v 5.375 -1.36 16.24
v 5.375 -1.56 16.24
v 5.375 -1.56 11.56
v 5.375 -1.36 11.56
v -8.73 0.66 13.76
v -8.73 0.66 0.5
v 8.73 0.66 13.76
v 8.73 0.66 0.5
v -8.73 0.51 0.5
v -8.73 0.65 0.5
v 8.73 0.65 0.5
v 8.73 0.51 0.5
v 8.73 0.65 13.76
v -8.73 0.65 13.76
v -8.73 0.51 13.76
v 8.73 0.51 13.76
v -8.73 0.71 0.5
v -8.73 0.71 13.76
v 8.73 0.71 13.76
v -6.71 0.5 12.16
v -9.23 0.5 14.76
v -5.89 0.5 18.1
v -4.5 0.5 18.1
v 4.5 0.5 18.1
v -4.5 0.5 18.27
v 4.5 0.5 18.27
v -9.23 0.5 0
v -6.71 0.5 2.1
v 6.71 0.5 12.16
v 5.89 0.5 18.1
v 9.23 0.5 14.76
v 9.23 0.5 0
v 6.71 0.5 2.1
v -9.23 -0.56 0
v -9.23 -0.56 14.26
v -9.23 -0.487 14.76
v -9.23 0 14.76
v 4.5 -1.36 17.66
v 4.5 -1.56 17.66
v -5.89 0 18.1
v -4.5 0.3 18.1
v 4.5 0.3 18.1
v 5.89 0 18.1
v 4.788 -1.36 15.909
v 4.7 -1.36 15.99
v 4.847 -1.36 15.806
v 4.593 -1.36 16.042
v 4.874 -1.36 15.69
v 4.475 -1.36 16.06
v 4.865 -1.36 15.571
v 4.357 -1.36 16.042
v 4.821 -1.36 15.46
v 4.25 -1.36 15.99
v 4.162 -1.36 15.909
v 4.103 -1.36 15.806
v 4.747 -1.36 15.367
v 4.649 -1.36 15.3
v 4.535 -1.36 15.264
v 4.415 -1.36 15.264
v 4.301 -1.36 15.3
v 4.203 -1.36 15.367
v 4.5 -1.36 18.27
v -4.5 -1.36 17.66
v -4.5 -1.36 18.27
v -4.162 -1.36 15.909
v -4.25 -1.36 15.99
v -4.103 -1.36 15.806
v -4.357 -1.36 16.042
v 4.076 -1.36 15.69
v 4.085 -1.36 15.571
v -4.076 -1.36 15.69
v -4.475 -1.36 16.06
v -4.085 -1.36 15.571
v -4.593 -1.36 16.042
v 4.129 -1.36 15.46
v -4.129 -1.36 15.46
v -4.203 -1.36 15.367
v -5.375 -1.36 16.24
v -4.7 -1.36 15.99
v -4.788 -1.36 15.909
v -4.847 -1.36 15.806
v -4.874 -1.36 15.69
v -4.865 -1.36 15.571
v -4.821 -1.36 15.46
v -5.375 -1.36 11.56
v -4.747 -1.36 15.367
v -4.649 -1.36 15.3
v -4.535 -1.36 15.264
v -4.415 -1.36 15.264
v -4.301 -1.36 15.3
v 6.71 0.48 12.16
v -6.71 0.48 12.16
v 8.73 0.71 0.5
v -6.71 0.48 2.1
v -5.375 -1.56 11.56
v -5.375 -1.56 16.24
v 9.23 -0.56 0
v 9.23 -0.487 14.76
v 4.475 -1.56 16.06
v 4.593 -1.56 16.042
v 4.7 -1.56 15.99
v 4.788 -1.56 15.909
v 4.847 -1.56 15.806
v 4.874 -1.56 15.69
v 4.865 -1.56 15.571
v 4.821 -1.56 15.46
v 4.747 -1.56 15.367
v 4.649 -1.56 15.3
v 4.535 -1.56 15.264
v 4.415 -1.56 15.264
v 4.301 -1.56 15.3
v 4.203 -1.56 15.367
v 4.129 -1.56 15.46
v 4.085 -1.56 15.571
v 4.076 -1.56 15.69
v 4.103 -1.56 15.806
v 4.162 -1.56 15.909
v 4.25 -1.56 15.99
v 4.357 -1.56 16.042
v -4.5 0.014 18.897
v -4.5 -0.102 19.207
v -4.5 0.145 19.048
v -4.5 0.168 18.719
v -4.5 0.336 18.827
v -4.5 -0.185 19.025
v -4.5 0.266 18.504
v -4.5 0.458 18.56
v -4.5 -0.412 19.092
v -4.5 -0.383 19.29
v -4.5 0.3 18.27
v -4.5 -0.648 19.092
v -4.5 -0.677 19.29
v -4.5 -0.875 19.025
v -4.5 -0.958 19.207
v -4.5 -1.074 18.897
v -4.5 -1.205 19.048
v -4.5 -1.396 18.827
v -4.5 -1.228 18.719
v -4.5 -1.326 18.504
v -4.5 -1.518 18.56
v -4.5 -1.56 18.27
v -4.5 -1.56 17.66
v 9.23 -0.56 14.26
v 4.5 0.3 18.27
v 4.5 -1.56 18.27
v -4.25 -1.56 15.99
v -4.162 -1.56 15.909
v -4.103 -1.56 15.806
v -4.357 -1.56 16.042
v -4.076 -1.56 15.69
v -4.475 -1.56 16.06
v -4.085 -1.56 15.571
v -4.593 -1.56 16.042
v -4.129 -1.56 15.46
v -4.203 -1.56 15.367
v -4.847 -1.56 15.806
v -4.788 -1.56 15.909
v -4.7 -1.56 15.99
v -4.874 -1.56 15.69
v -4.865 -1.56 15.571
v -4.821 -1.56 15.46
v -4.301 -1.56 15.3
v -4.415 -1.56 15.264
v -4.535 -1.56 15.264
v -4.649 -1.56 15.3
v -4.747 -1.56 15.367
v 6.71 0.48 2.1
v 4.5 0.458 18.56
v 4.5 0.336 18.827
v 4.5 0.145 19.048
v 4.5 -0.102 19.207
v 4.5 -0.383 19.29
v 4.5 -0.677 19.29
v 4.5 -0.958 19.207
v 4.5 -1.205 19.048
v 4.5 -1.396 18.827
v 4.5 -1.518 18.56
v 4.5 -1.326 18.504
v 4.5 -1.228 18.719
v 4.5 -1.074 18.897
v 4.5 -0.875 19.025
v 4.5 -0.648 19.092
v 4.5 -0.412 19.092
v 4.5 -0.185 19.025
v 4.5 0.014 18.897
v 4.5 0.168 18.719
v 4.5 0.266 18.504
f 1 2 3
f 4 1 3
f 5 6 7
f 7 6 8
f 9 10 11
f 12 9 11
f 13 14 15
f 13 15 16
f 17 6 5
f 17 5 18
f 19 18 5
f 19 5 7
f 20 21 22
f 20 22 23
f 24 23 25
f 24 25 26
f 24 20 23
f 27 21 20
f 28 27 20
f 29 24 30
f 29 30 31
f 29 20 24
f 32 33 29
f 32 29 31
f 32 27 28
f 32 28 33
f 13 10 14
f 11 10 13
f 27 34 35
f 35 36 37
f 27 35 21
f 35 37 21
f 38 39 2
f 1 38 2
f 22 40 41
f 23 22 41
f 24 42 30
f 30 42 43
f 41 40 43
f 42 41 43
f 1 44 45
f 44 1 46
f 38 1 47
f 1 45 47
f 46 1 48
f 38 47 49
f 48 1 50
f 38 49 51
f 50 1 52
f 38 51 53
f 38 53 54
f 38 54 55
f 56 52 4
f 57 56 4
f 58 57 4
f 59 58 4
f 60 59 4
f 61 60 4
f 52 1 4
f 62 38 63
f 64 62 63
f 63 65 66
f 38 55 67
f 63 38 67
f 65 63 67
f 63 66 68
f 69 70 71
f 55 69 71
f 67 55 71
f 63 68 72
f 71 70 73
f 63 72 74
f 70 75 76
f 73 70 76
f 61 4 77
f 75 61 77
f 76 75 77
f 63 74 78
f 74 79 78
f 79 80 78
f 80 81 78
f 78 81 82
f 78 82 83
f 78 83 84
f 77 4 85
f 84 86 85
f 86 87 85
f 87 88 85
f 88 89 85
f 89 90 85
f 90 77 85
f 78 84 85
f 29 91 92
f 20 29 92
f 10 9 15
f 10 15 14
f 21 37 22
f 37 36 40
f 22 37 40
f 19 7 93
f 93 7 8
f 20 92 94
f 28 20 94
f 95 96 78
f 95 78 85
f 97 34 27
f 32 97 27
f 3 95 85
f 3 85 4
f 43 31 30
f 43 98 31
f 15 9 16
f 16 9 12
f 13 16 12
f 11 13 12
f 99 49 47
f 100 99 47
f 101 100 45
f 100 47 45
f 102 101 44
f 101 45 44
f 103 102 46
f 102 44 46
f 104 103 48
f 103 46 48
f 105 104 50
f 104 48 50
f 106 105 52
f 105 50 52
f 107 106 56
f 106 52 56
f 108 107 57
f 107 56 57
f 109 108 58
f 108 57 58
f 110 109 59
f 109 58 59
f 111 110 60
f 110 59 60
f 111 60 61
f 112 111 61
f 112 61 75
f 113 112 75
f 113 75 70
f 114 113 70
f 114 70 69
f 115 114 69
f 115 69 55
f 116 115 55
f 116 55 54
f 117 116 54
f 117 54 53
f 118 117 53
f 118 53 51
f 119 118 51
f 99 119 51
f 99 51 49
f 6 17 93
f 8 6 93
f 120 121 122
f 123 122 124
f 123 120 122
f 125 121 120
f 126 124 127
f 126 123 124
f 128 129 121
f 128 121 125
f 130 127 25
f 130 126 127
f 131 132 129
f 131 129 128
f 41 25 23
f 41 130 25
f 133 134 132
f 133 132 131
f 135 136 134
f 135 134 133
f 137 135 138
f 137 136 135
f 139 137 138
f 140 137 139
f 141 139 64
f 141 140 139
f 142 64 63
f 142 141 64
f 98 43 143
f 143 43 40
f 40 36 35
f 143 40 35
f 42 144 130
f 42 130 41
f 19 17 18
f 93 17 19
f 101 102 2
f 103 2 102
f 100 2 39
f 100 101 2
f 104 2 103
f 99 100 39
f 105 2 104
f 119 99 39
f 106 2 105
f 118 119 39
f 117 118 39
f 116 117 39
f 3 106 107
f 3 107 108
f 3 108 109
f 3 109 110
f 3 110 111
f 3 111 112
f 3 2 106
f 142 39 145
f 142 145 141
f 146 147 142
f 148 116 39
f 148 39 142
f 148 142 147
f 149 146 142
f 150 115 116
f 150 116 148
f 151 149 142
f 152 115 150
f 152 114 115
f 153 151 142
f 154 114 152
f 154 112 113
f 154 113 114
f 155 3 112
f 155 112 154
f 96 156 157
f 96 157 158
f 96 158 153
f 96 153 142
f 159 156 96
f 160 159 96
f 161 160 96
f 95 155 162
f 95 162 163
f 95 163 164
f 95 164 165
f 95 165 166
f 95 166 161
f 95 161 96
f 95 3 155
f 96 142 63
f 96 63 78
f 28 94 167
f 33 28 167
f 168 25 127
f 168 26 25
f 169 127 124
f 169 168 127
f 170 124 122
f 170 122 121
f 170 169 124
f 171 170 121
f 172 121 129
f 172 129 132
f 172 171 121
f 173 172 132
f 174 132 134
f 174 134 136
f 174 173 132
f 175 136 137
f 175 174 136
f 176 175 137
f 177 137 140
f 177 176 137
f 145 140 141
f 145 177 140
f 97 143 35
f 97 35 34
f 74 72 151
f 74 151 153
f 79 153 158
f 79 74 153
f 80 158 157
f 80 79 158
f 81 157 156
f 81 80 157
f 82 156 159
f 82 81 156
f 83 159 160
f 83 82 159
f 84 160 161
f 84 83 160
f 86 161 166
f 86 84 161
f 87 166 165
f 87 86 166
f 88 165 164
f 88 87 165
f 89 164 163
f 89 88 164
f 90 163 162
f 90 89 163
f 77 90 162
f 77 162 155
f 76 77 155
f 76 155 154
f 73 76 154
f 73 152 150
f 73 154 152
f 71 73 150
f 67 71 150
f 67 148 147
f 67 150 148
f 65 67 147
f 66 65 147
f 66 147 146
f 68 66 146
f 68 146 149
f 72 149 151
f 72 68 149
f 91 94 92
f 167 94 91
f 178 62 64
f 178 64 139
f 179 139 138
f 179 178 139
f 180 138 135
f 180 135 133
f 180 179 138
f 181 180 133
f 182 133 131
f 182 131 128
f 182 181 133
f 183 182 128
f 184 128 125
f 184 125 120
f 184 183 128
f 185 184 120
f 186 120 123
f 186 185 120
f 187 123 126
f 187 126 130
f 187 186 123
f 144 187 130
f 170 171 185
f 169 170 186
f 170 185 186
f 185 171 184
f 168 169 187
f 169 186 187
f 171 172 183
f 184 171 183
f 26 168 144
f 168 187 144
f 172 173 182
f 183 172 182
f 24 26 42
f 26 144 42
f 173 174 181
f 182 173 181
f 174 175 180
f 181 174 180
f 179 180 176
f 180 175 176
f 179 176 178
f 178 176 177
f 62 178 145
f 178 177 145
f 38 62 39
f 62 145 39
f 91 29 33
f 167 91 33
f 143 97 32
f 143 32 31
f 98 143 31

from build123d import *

# Parameters (mm, degrees)
EXTRUDE_1_DEPTH      = 0.5
SKETCH_3_W           = 9.23
SKETCH_3_H           = 14.26
EXTRUDE_2_DEPTH      = 0.56
SKETCH_4_W           = 8.73
SKETCH_4_H           = 13.26
EXTRUDE_3_DEPTH      = 0.14
SKETCH_6_W           = 6.71
SKETCH_6_H           = 10.06
CUT_EXTRUDE_1_DEPTH  = 0.02
EXTRUDE_4_REACH      = 22.328
CUT_EXTRUDE_2_DEPTH  = 21.327946281
SKETCH_9_W           = 8.73
SKETCH_9_H           = 13.26
EXTRUDE_2209_DEPTH   = 0.05
MIRROR_START         = 0.5
MIRROR_1_OUTLINE_W   = 8.73
MIRROR_1_OUTLINE_H   = 0.05
MIRROR_1_DEPTH       = 13.26
MIRROR_1_2_OUTLINE_W = 8.73
MIRROR_1_2_OUTLINE_H = 0.14
MIRROR_1_2_DEPTH     = 13.26
MIRROR_1_3_DEPTH     = 0.48
MIRROR_START_2       = -0.56
MIRROR_1_4_OUTLINE_W = 6.71
MIRROR_1_4_OUTLINE_H = 10.06
MIRROR_1_4_DEPTH     = 0.60719
MIRROR_START_3       = 0.48
MIRROR_1_5_DEPTH     = 0.02
MIRROR_START_4       = -9.23
MIRROR_1_6_DEPTH     = 9.23
MIRROR_START_5       = -20
MIRROR_1_7_OUTLINE_W = 8
MIRROR_1_7_OUTLINE_H = 2
MIRROR_1_7_DEPTH     = 3.036508319
EXTRUDE_6_DEPTH      = 4.5
EXTRUDE_7_DEPTH      = 0.2
SKETCH_15_R          = 0.4
CUT_EXTRUDE_3_DEPTH  = 22.493436207


with BuildPart() as part:
    # 草图2 → 凸台-拉伸1 (new body)
    with BuildSketch(Plane(origin=(0, 0, 0), x_dir=(1, 0, 0), z_dir=(0, 1, 0))):
        Polygon((9.23, -14.76), (5.89, -18.1), (0, -18.1), (0, 0), (9.23, 0), align=None)
    extrude(amount=EXTRUDE_1_DEPTH)

    # 草图3 → 凸台-拉伸2 (add)
    with BuildSketch(Plane.XZ):
        with Locations((4.615, 7.13)):
            Rectangle(SKETCH_3_W, SKETCH_3_H)
    extrude(amount=EXTRUDE_2_DEPTH)

    # 草图6 → 切除-拉伸1 (cut)
    with BuildSketch(Plane(origin=(0, 0.5, 0), x_dir=(1, 0, 0), z_dir=(0, 1, 0))):
        with Locations((3.355, -7.13)):
            Rectangle(SKETCH_6_W, SKETCH_6_H)
    extrude(amount=-CUT_EXTRUDE_1_DEPTH, mode=Mode.SUBTRACT)

    # 凸台-拉伸4: up to this face of the body (flat: up to its plane)
    extrude_4_end = Plane(part.part.faces().sort_by_distance((9.23, -0.025444369, 7.250073411))[0])
    # 草图8 → 凸台-拉伸4 (add, up to the picked face)
    with BuildSketch(Plane.ZY, mode=Mode.PRIVATE) as extrude_4_sk1:
        Polygon((14.26, 0), (18.1, 0), (14.26, -0.56), align=None)
    extrude_4_tool1 = split(extrude(extrude_4_sk1.sketch, amount=-EXTRUDE_4_REACH, mode=Mode.PRIVATE), bisect_by=extrude_4_end, keep=Keep.BOTH, mode=Mode.PRIVATE)
    add(extrude_4_tool1.solids().sort_by(Axis((0, -0.186667, 15.54), (1, 0, 0)))[0])

    # 草图12 → 切除-拉伸2 (cut, through all)
    with BuildSketch(Plane(origin=(0, 0, 0), x_dir=(1, 0, 0), z_dir=(0, 1, 0))):
        Polygon((9.23, -14.76), (5.89, -18.1), (9.23, -18.1), align=None)
    extrude(amount=-CUT_EXTRUDE_2_DEPTH, mode=Mode.SUBTRACT)

    # Mirror 1 3 outline → Mirror 1 3 (add)
    with BuildSketch(Plane(origin=(0, 0, 0), x_dir=(1, 0, 0), z_dir=(0, 1, 0))):
        Polygon((-5.89, -18.1), (0, -18.1), (0, 0), (-9.23, 0), (-9.23, -14.76), align=None)
    extrude(amount=MIRROR_1_3_DEPTH)

    # Mirror 1 4 outline → Mirror 1 4 (add)
    with BuildSketch(Plane(origin=(0, 0, 0), x_dir=(1, 0, 0), z_dir=(0, 1, 0)).offset(MIRROR_START_2)):
        with Locations((-3.355, -7.13)):
            Rectangle(MIRROR_1_4_OUTLINE_W, MIRROR_1_4_OUTLINE_H)
    extrude(amount=MIRROR_1_4_DEPTH)

    # Mirror 1 5 outline → Mirror 1 5 (add)
    with BuildSketch(Plane(origin=(0, 0, 0), x_dir=(1, 0, 0), z_dir=(0, 1, 0)).offset(MIRROR_START_3)):
        Polygon((-5.89, -18.1), (0, -18.1), (0, -12.16), (-6.71, -12.16), (-6.71, -2.1), (0, -2.1), (0, 0), (-9.23, 0), (-9.23, -14.76), align=None)
    extrude(amount=MIRROR_1_5_DEPTH)

    # Mirror 1 6 outline → Mirror 1 6 (add)
    with BuildSketch(Plane.YZ.offset(MIRROR_START_4)):
        Polygon((-0.56, 0), (0, 0), (0, 18.1), (-0.56, 14.26), align=None)
    extrude(amount=MIRROR_1_6_DEPTH)

    # Mirror 1 7 outline → Mirror 1 7 (cut)
    with BuildSketch(Plane(origin=(0, 0, 0), x_dir=(0.707106781186552, 0, 0.7071067811865429), z_dir=(0.707106781186543, 0, -0.707106781186552)).offset(MIRROR_START_5)):
        with Locations((6, 1)):
            Rectangle(MIRROR_1_7_OUTLINE_W, MIRROR_1_7_OUTLINE_H)
    extrude(amount=MIRROR_1_7_DEPTH, mode=Mode.SUBTRACT)

    # 草图11 → 凸台-拉伸6 (add, symmetric)
    with BuildSketch(Plane(origin=(0, 0, 0), x_dir=(0, 0, -1), z_dir=(1, 0, 0))):
        with BuildLine():
            Line((-18.27, -1.56), (-18.27, -1.36))
            ThreePointArc((-18.27, -1.36), (-19.1, -0.53), (-18.27, 0.3))
            Line((-18.27, 0.3), (-18.1, 0.3))
            Line((-18.1, 0.3), (-18.1, 0.5))
            Line((-18.1, 0.5), (-18.27, 0.5))
            ThreePointArc((-18.27, 0.5), (-19.3, -0.53), (-18.27, -1.56))
        make_face()
    extrude(amount=EXTRUDE_6_DEPTH, both=True)

    # 草图14 → 凸台-拉伸7 (add)
    with BuildSketch(Plane(origin=(0, -1.56, 0), x_dir=(-1, 0, 0), z_dir=(0, -1, 0))):
        Polygon((-5.375, -16.24), (-5.375, -11.56), (0, -11.56), (0, -18.27), (-4.5, -18.27), (-4.5, -17.66), align=None)
    extrude_7 = extrude(amount=-EXTRUDE_7_DEPTH)

    # 草图15 → 切除-拉伸3 (cut, through all)
    with BuildSketch(Plane(origin=(0, -1.36, 0), x_dir=(1, 0, 0), z_dir=(0, 1, 0))):
        with Locations(Location((4.475, -15.66, 0), (0, 0, 270))):
            Circle(SKETCH_15_R)
    cut_extrude_3 = extrude(amount=-CUT_EXTRUDE_3_DEPTH, mode=Mode.SUBTRACT)

    # 镜向2: 凸台-拉伸7, 切除-拉伸3 across Right Plane
    add(extrude_7.mirror(Plane(origin=(0, 0, 0), x_dir=(0, 0, -1), z_dir=(1, 0, 0))))
    add(cut_extrude_3.mirror(Plane(origin=(0, 0, 0), x_dir=(0, 0, -1), z_dir=(1, 0, 0))), mode=Mode.SUBTRACT)


with BuildPart() as body_2:
    # 草图4 → 凸台-拉伸3 (new body)
    with BuildSketch(Plane(origin=(0, 0.51, 0), x_dir=(1, 0, 0), z_dir=(0, 1, 0))):
        with Locations((4.365, -7.13)):
            Rectangle(SKETCH_4_W, SKETCH_4_H)
    extrude(amount=EXTRUDE_3_DEPTH)

    # Mirror 1 2 outline → Mirror 1 2 (add)
    with BuildSketch(Plane.XY.offset(MIRROR_START)):
        with Locations((-4.365, 0.58)):
            Rectangle(MIRROR_1_2_OUTLINE_W, MIRROR_1_2_OUTLINE_H)
    extrude(amount=MIRROR_1_2_DEPTH)


with BuildPart() as body_3:
    # 草图9 → Extrude 2209 (new body)
    with BuildSketch(Plane(origin=(0, 0.66, 0), x_dir=(1, 0, 0), z_dir=(0, 1, 0))):
        with Locations((4.365, -7.13)):
            Rectangle(SKETCH_9_W, SKETCH_9_H)
    extrude(amount=EXTRUDE_2209_DEPTH)

    # 镜向1: read off the stored shape, not the designer's step
    # 镜向1 outline → 镜向1 (add)
    with BuildSketch(Plane.XY.offset(MIRROR_START)):
        with Locations((-4.365, 0.685)):
            Rectangle(MIRROR_1_OUTLINE_W, MIRROR_1_OUTLINE_H)
    extrude(amount=MIRROR_1_DEPTH)


solid = Compound([part.part, body_2.part, body_3.part])
